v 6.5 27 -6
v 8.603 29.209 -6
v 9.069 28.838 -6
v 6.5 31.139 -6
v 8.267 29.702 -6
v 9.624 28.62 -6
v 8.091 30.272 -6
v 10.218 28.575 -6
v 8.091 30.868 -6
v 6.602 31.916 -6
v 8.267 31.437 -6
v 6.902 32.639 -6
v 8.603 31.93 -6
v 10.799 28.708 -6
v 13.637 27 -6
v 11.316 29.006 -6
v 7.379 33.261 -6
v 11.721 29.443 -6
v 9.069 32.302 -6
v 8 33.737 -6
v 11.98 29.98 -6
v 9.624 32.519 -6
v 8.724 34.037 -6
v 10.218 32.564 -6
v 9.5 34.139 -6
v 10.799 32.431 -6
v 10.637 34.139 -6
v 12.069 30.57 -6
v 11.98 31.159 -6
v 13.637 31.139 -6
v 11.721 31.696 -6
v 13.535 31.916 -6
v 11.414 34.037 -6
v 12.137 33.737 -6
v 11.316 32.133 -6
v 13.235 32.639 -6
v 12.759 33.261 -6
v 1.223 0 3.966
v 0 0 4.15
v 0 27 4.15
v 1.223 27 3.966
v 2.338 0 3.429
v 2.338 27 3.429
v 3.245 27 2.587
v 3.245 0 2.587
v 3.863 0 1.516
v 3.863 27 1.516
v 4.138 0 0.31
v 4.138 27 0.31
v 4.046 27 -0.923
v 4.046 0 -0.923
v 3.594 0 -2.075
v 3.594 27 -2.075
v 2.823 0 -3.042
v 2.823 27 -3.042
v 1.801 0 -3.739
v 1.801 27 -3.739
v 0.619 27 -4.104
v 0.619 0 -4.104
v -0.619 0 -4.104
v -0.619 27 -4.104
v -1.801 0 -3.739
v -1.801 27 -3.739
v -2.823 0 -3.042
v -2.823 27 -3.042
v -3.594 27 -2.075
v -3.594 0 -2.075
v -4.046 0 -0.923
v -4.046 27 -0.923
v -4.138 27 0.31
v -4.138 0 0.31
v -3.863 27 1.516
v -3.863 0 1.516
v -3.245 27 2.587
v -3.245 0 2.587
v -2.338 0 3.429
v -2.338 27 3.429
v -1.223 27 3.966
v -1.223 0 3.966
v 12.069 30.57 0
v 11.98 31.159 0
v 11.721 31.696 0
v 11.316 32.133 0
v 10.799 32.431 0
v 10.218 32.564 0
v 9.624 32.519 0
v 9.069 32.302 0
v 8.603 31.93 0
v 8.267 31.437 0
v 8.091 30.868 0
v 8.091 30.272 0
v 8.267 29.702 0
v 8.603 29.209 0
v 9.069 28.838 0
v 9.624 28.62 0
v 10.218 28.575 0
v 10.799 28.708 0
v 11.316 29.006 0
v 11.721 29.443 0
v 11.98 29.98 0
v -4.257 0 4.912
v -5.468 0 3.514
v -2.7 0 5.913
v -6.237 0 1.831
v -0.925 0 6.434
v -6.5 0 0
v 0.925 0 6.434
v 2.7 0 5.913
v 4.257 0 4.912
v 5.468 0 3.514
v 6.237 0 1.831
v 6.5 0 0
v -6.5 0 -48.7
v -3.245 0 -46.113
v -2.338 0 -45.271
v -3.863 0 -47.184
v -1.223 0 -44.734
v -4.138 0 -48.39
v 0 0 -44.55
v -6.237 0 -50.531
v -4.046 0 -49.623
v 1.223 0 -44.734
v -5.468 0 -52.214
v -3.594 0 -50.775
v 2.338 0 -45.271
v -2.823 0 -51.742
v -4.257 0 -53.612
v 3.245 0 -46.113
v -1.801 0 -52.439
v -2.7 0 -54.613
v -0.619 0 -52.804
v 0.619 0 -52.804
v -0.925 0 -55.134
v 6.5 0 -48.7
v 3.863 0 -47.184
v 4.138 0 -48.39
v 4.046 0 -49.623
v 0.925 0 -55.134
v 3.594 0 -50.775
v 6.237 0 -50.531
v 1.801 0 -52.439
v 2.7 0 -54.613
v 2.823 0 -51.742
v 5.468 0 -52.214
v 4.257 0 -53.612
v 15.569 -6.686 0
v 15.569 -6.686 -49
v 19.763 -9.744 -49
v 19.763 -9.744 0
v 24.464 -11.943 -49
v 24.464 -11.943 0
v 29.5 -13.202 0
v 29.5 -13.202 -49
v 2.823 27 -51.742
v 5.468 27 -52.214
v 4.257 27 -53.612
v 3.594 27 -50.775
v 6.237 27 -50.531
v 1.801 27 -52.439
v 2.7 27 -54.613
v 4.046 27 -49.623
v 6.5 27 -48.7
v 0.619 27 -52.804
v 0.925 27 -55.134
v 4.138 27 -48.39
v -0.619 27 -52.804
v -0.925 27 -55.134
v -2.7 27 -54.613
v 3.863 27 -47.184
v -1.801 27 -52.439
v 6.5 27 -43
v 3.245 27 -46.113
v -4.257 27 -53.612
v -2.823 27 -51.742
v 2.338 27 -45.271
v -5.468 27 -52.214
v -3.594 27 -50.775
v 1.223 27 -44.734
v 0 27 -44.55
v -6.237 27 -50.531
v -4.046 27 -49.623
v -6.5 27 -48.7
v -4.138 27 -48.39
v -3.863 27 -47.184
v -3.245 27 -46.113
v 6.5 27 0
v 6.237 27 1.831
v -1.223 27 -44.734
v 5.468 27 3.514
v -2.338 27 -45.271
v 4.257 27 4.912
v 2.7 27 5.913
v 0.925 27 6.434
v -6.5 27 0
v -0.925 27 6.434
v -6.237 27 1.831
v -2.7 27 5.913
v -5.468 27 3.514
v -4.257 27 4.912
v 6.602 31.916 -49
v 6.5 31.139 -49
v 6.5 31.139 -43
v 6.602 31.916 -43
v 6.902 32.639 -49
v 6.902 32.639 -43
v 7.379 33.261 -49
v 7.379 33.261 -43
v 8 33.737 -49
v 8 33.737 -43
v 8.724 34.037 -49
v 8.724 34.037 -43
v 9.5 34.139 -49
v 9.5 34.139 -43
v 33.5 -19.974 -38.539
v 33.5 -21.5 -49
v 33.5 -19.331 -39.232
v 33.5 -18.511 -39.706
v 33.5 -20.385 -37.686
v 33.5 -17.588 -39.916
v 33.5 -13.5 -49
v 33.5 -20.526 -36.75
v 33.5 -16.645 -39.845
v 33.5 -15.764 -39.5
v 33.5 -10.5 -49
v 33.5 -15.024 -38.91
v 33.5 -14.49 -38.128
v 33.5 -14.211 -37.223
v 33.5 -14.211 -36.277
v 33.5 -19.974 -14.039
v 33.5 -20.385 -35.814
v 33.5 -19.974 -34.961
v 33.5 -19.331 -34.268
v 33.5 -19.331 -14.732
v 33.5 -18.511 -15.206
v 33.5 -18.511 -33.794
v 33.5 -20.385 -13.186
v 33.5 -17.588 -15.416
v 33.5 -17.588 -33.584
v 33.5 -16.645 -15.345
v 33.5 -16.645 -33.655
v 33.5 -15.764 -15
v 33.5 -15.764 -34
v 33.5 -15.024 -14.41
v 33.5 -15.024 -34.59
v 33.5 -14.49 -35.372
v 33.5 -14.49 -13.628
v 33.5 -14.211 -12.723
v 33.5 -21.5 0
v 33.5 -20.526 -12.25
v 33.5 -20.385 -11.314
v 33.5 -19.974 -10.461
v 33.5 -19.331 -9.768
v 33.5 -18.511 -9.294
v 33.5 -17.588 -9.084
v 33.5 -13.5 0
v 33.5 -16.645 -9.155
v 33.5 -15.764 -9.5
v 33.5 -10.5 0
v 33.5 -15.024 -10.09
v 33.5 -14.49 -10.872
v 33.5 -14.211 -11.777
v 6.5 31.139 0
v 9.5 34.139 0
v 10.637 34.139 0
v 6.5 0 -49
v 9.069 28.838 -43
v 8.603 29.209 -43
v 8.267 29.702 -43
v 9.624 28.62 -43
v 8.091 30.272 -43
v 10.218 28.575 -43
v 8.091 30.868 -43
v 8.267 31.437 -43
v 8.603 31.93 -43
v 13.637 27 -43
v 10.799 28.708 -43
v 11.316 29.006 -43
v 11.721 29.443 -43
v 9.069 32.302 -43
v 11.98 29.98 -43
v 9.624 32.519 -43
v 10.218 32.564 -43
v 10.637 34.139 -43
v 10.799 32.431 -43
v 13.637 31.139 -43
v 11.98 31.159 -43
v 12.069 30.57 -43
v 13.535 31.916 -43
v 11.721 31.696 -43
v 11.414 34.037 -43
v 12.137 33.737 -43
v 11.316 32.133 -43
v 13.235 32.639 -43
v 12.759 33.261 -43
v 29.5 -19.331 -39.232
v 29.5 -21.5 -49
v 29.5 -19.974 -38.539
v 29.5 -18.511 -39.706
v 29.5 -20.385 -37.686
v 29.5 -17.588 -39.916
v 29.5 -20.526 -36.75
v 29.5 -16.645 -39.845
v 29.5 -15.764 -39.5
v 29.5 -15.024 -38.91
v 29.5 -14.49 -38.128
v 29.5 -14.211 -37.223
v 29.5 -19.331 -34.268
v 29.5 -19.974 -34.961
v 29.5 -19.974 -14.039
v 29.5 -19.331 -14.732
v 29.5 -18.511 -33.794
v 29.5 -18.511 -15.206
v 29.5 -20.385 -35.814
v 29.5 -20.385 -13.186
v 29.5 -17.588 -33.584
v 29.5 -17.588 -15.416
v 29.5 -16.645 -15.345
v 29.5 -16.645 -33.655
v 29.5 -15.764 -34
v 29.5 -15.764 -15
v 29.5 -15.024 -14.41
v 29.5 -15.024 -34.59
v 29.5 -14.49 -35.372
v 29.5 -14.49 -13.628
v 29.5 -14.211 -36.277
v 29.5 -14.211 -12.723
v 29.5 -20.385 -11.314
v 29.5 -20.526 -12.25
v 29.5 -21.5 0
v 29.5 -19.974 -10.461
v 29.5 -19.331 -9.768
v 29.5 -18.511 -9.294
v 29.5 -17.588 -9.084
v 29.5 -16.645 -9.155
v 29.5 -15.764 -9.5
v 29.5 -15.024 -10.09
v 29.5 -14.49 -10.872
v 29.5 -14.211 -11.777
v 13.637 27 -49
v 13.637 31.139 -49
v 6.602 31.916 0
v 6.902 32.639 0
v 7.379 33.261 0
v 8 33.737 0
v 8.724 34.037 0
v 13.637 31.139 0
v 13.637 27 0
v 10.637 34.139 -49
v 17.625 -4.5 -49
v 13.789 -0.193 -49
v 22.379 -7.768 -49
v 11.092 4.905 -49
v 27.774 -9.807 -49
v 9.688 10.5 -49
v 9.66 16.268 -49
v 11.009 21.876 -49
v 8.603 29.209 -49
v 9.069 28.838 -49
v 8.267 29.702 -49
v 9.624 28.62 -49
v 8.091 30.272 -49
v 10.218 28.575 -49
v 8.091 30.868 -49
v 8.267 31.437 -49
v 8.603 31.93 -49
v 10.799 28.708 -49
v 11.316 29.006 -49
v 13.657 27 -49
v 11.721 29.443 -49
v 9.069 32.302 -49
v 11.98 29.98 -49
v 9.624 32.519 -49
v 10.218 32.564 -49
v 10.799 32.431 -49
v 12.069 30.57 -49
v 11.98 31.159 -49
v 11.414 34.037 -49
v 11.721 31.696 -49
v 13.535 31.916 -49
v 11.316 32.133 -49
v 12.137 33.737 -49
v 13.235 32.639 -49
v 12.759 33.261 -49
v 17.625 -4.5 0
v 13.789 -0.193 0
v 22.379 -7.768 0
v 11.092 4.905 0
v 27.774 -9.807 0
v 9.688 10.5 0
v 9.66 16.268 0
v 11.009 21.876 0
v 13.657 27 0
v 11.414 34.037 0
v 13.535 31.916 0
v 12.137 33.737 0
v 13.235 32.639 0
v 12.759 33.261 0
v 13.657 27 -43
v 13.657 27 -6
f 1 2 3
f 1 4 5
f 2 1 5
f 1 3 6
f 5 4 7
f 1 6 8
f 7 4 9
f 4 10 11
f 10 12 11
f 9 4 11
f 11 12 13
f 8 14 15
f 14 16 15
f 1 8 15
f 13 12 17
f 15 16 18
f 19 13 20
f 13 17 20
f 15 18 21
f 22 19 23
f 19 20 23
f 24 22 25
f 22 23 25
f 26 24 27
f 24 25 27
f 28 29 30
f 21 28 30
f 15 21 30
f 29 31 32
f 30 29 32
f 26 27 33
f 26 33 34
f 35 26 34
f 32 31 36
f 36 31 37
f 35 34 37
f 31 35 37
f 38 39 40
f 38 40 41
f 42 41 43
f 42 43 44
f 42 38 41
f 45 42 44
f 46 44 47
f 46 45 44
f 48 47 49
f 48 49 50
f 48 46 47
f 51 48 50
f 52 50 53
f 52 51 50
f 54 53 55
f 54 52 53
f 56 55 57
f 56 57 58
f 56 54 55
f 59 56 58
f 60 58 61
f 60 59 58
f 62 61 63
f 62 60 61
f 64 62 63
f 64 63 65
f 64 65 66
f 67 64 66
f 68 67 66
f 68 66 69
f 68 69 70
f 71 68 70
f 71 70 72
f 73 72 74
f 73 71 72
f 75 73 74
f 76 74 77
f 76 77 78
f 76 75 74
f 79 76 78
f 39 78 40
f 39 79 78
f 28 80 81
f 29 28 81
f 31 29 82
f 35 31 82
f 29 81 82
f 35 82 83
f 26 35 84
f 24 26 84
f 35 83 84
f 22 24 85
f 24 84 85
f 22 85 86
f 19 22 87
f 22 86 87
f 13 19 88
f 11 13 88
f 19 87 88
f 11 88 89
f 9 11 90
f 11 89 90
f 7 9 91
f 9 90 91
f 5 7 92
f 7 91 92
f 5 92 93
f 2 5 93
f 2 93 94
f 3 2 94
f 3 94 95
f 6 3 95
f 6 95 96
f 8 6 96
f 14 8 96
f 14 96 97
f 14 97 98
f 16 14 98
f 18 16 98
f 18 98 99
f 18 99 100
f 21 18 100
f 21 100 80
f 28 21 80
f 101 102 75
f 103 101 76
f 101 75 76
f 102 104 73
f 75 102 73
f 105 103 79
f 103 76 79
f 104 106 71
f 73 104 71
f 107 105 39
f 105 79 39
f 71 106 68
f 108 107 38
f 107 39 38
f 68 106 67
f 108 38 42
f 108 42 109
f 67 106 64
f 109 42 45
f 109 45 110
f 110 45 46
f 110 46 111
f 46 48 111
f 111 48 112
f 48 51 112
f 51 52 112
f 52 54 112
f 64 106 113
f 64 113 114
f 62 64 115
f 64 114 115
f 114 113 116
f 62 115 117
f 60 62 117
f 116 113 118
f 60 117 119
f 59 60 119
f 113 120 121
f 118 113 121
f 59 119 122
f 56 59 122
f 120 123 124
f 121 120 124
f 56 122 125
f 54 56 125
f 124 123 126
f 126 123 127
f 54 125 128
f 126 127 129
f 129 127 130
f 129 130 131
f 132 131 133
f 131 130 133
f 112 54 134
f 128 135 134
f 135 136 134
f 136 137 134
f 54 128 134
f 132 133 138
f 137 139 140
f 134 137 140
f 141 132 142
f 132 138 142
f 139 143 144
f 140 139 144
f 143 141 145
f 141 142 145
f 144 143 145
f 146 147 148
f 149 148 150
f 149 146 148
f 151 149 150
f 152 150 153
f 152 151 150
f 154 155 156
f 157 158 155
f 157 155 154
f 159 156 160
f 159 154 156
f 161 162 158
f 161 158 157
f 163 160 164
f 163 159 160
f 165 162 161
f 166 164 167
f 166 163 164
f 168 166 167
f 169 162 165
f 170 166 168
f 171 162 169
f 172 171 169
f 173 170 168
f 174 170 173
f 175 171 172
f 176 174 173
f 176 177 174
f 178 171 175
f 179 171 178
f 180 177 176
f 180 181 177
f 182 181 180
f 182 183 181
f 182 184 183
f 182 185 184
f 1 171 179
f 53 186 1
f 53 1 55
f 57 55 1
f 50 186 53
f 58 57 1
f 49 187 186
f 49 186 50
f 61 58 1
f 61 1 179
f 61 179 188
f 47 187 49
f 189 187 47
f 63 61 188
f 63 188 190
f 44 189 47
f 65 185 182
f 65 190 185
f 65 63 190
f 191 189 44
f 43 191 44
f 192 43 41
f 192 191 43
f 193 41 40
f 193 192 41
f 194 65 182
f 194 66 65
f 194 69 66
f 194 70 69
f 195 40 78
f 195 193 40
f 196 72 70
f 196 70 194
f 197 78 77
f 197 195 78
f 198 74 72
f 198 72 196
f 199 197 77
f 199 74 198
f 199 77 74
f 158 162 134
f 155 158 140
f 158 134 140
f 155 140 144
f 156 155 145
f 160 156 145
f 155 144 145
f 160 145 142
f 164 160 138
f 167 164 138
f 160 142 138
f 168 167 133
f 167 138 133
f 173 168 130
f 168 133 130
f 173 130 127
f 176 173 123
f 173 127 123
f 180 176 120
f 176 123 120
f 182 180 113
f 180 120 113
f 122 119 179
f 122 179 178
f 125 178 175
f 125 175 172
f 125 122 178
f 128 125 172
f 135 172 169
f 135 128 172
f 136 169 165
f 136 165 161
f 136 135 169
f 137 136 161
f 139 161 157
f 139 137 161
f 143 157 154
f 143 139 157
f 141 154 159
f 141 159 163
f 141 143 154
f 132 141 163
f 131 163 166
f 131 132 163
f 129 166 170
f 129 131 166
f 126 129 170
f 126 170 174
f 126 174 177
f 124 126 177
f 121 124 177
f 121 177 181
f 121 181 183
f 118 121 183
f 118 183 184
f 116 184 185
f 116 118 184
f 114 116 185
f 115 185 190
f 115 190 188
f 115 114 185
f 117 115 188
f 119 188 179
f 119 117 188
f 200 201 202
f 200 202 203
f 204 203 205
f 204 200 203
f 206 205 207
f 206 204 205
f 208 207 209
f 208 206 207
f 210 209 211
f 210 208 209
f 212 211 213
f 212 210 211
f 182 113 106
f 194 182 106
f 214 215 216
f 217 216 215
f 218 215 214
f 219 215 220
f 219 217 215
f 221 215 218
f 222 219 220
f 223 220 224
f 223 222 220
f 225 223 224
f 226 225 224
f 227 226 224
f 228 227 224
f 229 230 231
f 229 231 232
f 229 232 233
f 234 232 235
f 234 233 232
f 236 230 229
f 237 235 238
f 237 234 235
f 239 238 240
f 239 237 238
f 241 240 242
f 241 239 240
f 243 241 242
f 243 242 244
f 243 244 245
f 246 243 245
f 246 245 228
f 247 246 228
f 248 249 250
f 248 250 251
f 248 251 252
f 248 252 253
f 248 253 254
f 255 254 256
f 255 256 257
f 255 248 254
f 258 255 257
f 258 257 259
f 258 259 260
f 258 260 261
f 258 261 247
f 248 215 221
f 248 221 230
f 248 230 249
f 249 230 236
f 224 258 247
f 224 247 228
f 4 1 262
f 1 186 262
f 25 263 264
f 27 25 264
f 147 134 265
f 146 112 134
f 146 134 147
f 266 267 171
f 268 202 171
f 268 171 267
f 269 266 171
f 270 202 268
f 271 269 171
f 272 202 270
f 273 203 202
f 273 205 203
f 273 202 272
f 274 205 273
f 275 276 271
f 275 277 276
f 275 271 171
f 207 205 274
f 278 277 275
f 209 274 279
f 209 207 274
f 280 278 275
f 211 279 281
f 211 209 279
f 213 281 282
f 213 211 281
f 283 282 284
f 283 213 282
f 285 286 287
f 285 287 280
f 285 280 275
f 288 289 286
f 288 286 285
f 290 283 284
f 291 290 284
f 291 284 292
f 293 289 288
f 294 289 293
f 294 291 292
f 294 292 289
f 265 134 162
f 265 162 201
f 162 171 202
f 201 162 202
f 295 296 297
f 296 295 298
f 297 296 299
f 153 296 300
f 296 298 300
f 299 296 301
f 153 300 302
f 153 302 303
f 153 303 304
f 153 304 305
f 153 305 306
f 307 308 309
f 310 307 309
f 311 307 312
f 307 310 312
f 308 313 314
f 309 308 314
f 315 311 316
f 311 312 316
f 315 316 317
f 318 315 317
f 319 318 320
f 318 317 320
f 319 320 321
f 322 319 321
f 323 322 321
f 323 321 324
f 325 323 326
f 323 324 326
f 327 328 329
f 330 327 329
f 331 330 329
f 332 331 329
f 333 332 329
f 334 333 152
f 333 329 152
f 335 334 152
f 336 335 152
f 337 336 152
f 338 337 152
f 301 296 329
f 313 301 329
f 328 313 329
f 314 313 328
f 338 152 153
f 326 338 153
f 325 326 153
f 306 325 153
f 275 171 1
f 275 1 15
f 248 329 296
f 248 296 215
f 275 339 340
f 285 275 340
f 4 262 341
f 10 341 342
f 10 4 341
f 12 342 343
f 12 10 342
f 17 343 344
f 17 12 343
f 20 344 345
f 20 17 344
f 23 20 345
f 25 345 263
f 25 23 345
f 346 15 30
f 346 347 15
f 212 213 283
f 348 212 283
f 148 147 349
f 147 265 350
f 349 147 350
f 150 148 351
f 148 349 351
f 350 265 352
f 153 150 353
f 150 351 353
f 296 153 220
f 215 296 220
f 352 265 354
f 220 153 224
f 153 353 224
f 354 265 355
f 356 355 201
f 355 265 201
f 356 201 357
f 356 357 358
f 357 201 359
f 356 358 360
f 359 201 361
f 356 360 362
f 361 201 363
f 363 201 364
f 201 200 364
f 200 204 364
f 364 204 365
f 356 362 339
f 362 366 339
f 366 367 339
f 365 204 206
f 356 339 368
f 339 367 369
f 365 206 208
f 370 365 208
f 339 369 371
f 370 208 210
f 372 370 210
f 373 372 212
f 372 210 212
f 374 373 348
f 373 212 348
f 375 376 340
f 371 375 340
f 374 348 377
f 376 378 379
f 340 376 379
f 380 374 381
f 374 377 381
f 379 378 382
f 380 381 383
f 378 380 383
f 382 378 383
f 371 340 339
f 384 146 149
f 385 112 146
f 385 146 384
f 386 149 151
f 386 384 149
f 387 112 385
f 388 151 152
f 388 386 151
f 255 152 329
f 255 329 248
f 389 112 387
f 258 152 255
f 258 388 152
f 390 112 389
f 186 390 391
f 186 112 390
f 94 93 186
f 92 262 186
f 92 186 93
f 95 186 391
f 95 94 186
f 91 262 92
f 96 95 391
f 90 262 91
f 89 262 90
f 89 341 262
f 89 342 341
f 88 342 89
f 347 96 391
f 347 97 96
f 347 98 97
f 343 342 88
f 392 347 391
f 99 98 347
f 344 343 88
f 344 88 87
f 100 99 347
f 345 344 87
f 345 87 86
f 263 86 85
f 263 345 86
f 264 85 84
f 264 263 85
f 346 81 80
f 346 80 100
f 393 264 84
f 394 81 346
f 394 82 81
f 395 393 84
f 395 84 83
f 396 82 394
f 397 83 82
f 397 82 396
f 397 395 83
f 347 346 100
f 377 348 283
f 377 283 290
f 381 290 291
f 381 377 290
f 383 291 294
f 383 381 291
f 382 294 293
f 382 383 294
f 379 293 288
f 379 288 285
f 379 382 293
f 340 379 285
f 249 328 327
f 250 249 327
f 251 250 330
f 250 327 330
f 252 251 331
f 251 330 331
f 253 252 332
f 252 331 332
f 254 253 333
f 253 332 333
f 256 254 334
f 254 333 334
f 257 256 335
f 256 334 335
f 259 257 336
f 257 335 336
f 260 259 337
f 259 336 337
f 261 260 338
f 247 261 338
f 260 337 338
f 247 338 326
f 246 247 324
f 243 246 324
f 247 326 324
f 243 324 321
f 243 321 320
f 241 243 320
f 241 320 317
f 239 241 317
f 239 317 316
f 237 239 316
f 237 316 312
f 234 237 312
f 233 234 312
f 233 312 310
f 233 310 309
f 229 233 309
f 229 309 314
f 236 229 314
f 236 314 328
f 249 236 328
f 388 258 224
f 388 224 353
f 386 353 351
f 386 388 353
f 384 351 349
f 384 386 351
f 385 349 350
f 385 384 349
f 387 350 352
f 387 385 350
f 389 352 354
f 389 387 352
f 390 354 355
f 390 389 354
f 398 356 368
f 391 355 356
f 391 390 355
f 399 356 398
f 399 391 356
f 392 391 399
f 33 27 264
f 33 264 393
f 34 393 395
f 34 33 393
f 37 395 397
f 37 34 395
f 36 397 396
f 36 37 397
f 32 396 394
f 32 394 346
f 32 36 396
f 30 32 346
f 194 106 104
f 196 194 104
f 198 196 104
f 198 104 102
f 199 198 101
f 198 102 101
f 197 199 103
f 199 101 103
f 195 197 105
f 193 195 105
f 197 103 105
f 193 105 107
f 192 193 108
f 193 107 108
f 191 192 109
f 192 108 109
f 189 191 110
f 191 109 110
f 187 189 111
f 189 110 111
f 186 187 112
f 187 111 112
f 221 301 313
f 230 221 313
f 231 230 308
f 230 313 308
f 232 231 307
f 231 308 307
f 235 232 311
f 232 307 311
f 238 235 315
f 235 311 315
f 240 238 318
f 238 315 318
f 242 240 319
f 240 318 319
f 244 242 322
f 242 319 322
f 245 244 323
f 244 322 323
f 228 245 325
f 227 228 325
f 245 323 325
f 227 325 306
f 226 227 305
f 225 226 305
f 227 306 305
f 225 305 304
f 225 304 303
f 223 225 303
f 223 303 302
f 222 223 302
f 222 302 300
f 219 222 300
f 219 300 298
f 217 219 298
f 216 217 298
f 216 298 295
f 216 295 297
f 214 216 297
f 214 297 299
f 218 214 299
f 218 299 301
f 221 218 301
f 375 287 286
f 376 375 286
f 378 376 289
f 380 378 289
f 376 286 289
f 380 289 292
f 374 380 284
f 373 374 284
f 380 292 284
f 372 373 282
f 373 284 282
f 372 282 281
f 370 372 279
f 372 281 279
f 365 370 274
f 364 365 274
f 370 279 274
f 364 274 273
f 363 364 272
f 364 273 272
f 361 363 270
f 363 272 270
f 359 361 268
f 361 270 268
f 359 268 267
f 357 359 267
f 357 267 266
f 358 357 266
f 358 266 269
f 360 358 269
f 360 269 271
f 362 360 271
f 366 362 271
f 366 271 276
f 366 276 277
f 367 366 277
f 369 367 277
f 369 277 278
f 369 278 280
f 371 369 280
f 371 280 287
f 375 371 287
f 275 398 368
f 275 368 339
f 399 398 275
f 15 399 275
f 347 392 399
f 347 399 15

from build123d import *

# Parameters (mm, degrees)
SKETCH1_R           = 4.15
BOSS_EXTRUDE1_DEPTH = 27
BOSS_EXTRUDE2_DEPTH = 49
SKETCH3_W           = 7.137224295
SKETCH3_H           = 7.139279227
BOSS_EXTRUDE3_DEPTH = 49
SKETCH4_R           = 2
CUT_EXTRUDE1_DEPTH  = 51
FILLET1_R           = 3
SKETCH5_W           = 7.156865167
SKETCH5_H           = 37
CUT_EXTRUDE2_DEPTH  = 7.139279
SKETCH7_W           = 36.574972609
SKETCH7_H           = 48.532858444
CUT_EXTRUDE3_DEPTH  = 51
SKETCH8_W           = 4
SKETCH8_H           = 11
BOSS_EXTRUDE4_DEPTH = 49
SKETCH10_R          = 3.175
CUT_EXTRUDE4_DEPTH  = 49


with BuildPart() as part:
    # Sketch1 → Boss-Extrude1 (new body)
    with BuildSketch(Plane(origin=(0, 0, 0), x_dir=(1, 0, 0), z_dir=(0, 1, 0))):
        with BuildLine():
            Line((-6.5, 48.7), (-6.5, 0))
            ThreePointArc((-6.5, 0), (0, -6.5), (6.5, 0))
            Line((6.5, 0), (6.5, 48.7))
            ThreePointArc((6.5, 48.7), (0, 55.2), (-6.5, 48.7))
        make_face()
        with Locations(Location((0, 0, 0), (0, 0, 270))):  # turned: the seam where the file's is
            Circle(SKETCH1_R, mode=Mode.SUBTRACT)
        with Locations(Location((0, 48.7, 0), (0, 0, 270))):  # turned: the seam where the file's is
            Circle(SKETCH1_R, mode=Mode.SUBTRACT)
    extrude(amount=BOSS_EXTRUDE1_DEPTH)

    # Sketch2 → Boss-Extrude2 (add)
    with BuildSketch(Plane.XY):
        with BuildLine():
            Line((6.5, 27), (6.5, 0))
            Line((6.5, 0), (15.568570347, -6.685733343))
            ThreePointArc((15.568570347, -6.685733343), (43.70403904, -11.497551626), (60.435084664, 11.628846841))
            Line((60.435084664, 11.628846841), (62.638339389, 10.782838022))
            Line((62.638339389, 10.782838022), (62.638339389, 13.5))
            Line((62.638339389, 13.5), (57.5, 13.5))
            ThreePointArc((57.5, 13.5), (26.437253933, -9.437253933), (13.656865167, 27))
            Line((13.656865167, 27), (6.5, 27))
        make_face()
    extrude(amount=-BOSS_EXTRUDE2_DEPTH)

    # Sketch3 → Boss-Extrude3 (add)
    with BuildSketch(Plane.XY):
        with Locations((10.068612148, 30.569639614)):
            Rectangle(SKETCH3_W, SKETCH3_H)
    extrude(amount=-BOSS_EXTRUDE3_DEPTH)

    # Sketch4 → Cut-Extrude1 (cut)
    with BuildSketch(Plane.XY):
        with Locations((10.068612147, 30.569639613)):
            Circle(SKETCH4_R)
    extrude(amount=-CUT_EXTRUDE1_DEPTH, mode=Mode.SUBTRACT)

    # Fillet1
    fillet1_edges = [part.edges().sort_by_distance(p)[0] for p in [
        (6.5, 34.139279227, -24.5),
        (13.637224295, 34.139279227, -24.5),
    ]]
    fillet(fillet1_edges, radius=FILLET1_R)

    # Sketch5 → Cut-Extrude2 (cut)
    with BuildSketch(Plane(origin=(0, 34.139279227, 0), x_dir=(1, 0, 0), z_dir=(0, 1, 0))):
        with Locations((10.078432583, 24.5)):
            Rectangle(SKETCH5_W, SKETCH5_H)
    extrude(amount=-CUT_EXTRUDE2_DEPTH, mode=Mode.SUBTRACT)

    # Sketch7 → Cut-Extrude3 (cut)
    with BuildSketch(Plane.XY):
        with Locations((51.787486304, 3.889520552)):
            Rectangle(SKETCH7_W, SKETCH7_H)
    extrude(amount=-CUT_EXTRUDE3_DEPTH, mode=Mode.SUBTRACT)

    # Sketch8 → Boss-Extrude4 (add)
    with BuildSketch(Plane.XY):
        with Locations((31.5, -16)):
            Rectangle(SKETCH8_W, SKETCH8_H)
    extrude(amount=-BOSS_EXTRUDE4_DEPTH)

    # Sketch10 → Cut-Extrude4 (cut)
    with BuildSketch(Plane.ZY.offset(-29.5)):
        with Locations(Location((-36.75, -17.351029923, 0), (0, 0, 270))):  # turned: the seam where the file's is
            Circle(SKETCH10_R)
        with Locations(Location((-12.25, -17.351029923, 0), (0, 0, 270))):  # turned: the seam where the file's is
            Circle(SKETCH10_R)
    extrude(amount=-CUT_EXTRUDE4_DEPTH, mode=Mode.SUBTRACT)


solid = part.part
